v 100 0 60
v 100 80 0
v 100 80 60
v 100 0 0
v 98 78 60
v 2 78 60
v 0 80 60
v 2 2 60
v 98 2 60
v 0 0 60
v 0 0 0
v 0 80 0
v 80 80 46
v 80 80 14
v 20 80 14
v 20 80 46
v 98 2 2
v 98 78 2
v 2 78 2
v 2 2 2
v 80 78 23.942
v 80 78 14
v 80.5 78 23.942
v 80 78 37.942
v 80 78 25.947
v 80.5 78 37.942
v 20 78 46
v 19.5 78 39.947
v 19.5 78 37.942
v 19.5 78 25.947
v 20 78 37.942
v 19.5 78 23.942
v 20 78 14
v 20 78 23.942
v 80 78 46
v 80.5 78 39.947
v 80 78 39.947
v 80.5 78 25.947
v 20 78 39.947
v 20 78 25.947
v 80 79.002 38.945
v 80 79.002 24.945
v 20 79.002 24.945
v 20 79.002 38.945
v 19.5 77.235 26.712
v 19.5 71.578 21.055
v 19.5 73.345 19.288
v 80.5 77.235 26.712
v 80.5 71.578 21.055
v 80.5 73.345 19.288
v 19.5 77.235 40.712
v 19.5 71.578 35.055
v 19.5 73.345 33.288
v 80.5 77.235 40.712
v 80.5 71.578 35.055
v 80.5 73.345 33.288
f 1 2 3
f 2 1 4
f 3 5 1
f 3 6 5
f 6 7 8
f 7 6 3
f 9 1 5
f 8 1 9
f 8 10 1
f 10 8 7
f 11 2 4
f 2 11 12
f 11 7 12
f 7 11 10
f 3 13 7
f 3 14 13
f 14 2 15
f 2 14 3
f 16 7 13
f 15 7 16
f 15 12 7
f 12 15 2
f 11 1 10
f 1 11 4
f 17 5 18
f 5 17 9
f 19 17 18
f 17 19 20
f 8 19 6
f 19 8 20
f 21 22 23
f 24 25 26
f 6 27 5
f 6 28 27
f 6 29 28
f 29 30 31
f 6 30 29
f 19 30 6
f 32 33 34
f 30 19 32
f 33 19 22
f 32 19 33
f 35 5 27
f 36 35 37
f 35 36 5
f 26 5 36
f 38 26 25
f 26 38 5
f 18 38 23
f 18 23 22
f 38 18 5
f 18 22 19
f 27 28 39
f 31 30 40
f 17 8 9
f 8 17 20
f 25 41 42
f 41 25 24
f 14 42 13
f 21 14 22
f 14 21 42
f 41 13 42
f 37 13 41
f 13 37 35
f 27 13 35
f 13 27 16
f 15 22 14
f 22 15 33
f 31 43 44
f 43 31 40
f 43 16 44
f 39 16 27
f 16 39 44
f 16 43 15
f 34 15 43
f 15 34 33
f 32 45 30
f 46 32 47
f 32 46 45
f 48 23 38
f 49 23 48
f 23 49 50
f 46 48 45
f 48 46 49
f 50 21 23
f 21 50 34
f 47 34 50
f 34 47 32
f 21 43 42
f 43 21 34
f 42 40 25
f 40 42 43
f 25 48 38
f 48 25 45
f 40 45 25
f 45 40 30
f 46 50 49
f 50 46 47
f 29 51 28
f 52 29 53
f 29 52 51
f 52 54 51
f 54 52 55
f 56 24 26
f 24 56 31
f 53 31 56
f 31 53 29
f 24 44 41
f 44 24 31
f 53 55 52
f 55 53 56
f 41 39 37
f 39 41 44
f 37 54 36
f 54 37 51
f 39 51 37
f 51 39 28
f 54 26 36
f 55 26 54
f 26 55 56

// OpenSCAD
$fn = 32;

// ----------------------------------------------------------------------
// Vent box: louvers enclosure
// ----------------------------------------------------------------------

// --- parameters (mm) ---
box_l = 100;              // box length, X
box_w = 80;               // box width, Y
box_h = 60;               // box height, Z
wall_t = 2;               // shell wall thickness
win_l = 60;               // vent window width, X
win_h = 32;               // vent window height, Z
slat_t = 2.5;             // louver slat thickness
slat_d = 8;               // louver slat depth
slat_a = 45;              // louver slat angle, degrees
slat_pitch = 14;          // louver pitch
slat_yc = 75.29;          // slat centreline Y
fit_tol = 0.02;           // tolerance for press fits, mm
free_tol = 0.2;           // tolerance for clearance fits, mm

win_z0 = (box_h - win_h) / 2;  // window lower edge Z
n_slats = 2;  // louver count
slat_z0 = win_z0 + (win_h - (n_slats - 1) * slat_pitch) / 2;

difference() {
  union() {
    difference() {
      cube([box_l, box_w, box_h]);
  translate([wall_t, wall_t, wall_t])
    cube([box_l - 2 * wall_t, box_w - 2 * wall_t, box_h]);
  translate([(box_l - win_l) / 2, box_w - wall_t - 1, win_z0])
    cube([win_l, wall_t + 2, win_h]);
    }
    for (i = [0 : n_slats - 1])
      translate([box_l / 2, slat_yc, slat_z0 + i * slat_pitch])
        rotate([slat_a, 0, 0])
          cube([win_l + 1, slat_d, slat_t], center = true);
  }
}
